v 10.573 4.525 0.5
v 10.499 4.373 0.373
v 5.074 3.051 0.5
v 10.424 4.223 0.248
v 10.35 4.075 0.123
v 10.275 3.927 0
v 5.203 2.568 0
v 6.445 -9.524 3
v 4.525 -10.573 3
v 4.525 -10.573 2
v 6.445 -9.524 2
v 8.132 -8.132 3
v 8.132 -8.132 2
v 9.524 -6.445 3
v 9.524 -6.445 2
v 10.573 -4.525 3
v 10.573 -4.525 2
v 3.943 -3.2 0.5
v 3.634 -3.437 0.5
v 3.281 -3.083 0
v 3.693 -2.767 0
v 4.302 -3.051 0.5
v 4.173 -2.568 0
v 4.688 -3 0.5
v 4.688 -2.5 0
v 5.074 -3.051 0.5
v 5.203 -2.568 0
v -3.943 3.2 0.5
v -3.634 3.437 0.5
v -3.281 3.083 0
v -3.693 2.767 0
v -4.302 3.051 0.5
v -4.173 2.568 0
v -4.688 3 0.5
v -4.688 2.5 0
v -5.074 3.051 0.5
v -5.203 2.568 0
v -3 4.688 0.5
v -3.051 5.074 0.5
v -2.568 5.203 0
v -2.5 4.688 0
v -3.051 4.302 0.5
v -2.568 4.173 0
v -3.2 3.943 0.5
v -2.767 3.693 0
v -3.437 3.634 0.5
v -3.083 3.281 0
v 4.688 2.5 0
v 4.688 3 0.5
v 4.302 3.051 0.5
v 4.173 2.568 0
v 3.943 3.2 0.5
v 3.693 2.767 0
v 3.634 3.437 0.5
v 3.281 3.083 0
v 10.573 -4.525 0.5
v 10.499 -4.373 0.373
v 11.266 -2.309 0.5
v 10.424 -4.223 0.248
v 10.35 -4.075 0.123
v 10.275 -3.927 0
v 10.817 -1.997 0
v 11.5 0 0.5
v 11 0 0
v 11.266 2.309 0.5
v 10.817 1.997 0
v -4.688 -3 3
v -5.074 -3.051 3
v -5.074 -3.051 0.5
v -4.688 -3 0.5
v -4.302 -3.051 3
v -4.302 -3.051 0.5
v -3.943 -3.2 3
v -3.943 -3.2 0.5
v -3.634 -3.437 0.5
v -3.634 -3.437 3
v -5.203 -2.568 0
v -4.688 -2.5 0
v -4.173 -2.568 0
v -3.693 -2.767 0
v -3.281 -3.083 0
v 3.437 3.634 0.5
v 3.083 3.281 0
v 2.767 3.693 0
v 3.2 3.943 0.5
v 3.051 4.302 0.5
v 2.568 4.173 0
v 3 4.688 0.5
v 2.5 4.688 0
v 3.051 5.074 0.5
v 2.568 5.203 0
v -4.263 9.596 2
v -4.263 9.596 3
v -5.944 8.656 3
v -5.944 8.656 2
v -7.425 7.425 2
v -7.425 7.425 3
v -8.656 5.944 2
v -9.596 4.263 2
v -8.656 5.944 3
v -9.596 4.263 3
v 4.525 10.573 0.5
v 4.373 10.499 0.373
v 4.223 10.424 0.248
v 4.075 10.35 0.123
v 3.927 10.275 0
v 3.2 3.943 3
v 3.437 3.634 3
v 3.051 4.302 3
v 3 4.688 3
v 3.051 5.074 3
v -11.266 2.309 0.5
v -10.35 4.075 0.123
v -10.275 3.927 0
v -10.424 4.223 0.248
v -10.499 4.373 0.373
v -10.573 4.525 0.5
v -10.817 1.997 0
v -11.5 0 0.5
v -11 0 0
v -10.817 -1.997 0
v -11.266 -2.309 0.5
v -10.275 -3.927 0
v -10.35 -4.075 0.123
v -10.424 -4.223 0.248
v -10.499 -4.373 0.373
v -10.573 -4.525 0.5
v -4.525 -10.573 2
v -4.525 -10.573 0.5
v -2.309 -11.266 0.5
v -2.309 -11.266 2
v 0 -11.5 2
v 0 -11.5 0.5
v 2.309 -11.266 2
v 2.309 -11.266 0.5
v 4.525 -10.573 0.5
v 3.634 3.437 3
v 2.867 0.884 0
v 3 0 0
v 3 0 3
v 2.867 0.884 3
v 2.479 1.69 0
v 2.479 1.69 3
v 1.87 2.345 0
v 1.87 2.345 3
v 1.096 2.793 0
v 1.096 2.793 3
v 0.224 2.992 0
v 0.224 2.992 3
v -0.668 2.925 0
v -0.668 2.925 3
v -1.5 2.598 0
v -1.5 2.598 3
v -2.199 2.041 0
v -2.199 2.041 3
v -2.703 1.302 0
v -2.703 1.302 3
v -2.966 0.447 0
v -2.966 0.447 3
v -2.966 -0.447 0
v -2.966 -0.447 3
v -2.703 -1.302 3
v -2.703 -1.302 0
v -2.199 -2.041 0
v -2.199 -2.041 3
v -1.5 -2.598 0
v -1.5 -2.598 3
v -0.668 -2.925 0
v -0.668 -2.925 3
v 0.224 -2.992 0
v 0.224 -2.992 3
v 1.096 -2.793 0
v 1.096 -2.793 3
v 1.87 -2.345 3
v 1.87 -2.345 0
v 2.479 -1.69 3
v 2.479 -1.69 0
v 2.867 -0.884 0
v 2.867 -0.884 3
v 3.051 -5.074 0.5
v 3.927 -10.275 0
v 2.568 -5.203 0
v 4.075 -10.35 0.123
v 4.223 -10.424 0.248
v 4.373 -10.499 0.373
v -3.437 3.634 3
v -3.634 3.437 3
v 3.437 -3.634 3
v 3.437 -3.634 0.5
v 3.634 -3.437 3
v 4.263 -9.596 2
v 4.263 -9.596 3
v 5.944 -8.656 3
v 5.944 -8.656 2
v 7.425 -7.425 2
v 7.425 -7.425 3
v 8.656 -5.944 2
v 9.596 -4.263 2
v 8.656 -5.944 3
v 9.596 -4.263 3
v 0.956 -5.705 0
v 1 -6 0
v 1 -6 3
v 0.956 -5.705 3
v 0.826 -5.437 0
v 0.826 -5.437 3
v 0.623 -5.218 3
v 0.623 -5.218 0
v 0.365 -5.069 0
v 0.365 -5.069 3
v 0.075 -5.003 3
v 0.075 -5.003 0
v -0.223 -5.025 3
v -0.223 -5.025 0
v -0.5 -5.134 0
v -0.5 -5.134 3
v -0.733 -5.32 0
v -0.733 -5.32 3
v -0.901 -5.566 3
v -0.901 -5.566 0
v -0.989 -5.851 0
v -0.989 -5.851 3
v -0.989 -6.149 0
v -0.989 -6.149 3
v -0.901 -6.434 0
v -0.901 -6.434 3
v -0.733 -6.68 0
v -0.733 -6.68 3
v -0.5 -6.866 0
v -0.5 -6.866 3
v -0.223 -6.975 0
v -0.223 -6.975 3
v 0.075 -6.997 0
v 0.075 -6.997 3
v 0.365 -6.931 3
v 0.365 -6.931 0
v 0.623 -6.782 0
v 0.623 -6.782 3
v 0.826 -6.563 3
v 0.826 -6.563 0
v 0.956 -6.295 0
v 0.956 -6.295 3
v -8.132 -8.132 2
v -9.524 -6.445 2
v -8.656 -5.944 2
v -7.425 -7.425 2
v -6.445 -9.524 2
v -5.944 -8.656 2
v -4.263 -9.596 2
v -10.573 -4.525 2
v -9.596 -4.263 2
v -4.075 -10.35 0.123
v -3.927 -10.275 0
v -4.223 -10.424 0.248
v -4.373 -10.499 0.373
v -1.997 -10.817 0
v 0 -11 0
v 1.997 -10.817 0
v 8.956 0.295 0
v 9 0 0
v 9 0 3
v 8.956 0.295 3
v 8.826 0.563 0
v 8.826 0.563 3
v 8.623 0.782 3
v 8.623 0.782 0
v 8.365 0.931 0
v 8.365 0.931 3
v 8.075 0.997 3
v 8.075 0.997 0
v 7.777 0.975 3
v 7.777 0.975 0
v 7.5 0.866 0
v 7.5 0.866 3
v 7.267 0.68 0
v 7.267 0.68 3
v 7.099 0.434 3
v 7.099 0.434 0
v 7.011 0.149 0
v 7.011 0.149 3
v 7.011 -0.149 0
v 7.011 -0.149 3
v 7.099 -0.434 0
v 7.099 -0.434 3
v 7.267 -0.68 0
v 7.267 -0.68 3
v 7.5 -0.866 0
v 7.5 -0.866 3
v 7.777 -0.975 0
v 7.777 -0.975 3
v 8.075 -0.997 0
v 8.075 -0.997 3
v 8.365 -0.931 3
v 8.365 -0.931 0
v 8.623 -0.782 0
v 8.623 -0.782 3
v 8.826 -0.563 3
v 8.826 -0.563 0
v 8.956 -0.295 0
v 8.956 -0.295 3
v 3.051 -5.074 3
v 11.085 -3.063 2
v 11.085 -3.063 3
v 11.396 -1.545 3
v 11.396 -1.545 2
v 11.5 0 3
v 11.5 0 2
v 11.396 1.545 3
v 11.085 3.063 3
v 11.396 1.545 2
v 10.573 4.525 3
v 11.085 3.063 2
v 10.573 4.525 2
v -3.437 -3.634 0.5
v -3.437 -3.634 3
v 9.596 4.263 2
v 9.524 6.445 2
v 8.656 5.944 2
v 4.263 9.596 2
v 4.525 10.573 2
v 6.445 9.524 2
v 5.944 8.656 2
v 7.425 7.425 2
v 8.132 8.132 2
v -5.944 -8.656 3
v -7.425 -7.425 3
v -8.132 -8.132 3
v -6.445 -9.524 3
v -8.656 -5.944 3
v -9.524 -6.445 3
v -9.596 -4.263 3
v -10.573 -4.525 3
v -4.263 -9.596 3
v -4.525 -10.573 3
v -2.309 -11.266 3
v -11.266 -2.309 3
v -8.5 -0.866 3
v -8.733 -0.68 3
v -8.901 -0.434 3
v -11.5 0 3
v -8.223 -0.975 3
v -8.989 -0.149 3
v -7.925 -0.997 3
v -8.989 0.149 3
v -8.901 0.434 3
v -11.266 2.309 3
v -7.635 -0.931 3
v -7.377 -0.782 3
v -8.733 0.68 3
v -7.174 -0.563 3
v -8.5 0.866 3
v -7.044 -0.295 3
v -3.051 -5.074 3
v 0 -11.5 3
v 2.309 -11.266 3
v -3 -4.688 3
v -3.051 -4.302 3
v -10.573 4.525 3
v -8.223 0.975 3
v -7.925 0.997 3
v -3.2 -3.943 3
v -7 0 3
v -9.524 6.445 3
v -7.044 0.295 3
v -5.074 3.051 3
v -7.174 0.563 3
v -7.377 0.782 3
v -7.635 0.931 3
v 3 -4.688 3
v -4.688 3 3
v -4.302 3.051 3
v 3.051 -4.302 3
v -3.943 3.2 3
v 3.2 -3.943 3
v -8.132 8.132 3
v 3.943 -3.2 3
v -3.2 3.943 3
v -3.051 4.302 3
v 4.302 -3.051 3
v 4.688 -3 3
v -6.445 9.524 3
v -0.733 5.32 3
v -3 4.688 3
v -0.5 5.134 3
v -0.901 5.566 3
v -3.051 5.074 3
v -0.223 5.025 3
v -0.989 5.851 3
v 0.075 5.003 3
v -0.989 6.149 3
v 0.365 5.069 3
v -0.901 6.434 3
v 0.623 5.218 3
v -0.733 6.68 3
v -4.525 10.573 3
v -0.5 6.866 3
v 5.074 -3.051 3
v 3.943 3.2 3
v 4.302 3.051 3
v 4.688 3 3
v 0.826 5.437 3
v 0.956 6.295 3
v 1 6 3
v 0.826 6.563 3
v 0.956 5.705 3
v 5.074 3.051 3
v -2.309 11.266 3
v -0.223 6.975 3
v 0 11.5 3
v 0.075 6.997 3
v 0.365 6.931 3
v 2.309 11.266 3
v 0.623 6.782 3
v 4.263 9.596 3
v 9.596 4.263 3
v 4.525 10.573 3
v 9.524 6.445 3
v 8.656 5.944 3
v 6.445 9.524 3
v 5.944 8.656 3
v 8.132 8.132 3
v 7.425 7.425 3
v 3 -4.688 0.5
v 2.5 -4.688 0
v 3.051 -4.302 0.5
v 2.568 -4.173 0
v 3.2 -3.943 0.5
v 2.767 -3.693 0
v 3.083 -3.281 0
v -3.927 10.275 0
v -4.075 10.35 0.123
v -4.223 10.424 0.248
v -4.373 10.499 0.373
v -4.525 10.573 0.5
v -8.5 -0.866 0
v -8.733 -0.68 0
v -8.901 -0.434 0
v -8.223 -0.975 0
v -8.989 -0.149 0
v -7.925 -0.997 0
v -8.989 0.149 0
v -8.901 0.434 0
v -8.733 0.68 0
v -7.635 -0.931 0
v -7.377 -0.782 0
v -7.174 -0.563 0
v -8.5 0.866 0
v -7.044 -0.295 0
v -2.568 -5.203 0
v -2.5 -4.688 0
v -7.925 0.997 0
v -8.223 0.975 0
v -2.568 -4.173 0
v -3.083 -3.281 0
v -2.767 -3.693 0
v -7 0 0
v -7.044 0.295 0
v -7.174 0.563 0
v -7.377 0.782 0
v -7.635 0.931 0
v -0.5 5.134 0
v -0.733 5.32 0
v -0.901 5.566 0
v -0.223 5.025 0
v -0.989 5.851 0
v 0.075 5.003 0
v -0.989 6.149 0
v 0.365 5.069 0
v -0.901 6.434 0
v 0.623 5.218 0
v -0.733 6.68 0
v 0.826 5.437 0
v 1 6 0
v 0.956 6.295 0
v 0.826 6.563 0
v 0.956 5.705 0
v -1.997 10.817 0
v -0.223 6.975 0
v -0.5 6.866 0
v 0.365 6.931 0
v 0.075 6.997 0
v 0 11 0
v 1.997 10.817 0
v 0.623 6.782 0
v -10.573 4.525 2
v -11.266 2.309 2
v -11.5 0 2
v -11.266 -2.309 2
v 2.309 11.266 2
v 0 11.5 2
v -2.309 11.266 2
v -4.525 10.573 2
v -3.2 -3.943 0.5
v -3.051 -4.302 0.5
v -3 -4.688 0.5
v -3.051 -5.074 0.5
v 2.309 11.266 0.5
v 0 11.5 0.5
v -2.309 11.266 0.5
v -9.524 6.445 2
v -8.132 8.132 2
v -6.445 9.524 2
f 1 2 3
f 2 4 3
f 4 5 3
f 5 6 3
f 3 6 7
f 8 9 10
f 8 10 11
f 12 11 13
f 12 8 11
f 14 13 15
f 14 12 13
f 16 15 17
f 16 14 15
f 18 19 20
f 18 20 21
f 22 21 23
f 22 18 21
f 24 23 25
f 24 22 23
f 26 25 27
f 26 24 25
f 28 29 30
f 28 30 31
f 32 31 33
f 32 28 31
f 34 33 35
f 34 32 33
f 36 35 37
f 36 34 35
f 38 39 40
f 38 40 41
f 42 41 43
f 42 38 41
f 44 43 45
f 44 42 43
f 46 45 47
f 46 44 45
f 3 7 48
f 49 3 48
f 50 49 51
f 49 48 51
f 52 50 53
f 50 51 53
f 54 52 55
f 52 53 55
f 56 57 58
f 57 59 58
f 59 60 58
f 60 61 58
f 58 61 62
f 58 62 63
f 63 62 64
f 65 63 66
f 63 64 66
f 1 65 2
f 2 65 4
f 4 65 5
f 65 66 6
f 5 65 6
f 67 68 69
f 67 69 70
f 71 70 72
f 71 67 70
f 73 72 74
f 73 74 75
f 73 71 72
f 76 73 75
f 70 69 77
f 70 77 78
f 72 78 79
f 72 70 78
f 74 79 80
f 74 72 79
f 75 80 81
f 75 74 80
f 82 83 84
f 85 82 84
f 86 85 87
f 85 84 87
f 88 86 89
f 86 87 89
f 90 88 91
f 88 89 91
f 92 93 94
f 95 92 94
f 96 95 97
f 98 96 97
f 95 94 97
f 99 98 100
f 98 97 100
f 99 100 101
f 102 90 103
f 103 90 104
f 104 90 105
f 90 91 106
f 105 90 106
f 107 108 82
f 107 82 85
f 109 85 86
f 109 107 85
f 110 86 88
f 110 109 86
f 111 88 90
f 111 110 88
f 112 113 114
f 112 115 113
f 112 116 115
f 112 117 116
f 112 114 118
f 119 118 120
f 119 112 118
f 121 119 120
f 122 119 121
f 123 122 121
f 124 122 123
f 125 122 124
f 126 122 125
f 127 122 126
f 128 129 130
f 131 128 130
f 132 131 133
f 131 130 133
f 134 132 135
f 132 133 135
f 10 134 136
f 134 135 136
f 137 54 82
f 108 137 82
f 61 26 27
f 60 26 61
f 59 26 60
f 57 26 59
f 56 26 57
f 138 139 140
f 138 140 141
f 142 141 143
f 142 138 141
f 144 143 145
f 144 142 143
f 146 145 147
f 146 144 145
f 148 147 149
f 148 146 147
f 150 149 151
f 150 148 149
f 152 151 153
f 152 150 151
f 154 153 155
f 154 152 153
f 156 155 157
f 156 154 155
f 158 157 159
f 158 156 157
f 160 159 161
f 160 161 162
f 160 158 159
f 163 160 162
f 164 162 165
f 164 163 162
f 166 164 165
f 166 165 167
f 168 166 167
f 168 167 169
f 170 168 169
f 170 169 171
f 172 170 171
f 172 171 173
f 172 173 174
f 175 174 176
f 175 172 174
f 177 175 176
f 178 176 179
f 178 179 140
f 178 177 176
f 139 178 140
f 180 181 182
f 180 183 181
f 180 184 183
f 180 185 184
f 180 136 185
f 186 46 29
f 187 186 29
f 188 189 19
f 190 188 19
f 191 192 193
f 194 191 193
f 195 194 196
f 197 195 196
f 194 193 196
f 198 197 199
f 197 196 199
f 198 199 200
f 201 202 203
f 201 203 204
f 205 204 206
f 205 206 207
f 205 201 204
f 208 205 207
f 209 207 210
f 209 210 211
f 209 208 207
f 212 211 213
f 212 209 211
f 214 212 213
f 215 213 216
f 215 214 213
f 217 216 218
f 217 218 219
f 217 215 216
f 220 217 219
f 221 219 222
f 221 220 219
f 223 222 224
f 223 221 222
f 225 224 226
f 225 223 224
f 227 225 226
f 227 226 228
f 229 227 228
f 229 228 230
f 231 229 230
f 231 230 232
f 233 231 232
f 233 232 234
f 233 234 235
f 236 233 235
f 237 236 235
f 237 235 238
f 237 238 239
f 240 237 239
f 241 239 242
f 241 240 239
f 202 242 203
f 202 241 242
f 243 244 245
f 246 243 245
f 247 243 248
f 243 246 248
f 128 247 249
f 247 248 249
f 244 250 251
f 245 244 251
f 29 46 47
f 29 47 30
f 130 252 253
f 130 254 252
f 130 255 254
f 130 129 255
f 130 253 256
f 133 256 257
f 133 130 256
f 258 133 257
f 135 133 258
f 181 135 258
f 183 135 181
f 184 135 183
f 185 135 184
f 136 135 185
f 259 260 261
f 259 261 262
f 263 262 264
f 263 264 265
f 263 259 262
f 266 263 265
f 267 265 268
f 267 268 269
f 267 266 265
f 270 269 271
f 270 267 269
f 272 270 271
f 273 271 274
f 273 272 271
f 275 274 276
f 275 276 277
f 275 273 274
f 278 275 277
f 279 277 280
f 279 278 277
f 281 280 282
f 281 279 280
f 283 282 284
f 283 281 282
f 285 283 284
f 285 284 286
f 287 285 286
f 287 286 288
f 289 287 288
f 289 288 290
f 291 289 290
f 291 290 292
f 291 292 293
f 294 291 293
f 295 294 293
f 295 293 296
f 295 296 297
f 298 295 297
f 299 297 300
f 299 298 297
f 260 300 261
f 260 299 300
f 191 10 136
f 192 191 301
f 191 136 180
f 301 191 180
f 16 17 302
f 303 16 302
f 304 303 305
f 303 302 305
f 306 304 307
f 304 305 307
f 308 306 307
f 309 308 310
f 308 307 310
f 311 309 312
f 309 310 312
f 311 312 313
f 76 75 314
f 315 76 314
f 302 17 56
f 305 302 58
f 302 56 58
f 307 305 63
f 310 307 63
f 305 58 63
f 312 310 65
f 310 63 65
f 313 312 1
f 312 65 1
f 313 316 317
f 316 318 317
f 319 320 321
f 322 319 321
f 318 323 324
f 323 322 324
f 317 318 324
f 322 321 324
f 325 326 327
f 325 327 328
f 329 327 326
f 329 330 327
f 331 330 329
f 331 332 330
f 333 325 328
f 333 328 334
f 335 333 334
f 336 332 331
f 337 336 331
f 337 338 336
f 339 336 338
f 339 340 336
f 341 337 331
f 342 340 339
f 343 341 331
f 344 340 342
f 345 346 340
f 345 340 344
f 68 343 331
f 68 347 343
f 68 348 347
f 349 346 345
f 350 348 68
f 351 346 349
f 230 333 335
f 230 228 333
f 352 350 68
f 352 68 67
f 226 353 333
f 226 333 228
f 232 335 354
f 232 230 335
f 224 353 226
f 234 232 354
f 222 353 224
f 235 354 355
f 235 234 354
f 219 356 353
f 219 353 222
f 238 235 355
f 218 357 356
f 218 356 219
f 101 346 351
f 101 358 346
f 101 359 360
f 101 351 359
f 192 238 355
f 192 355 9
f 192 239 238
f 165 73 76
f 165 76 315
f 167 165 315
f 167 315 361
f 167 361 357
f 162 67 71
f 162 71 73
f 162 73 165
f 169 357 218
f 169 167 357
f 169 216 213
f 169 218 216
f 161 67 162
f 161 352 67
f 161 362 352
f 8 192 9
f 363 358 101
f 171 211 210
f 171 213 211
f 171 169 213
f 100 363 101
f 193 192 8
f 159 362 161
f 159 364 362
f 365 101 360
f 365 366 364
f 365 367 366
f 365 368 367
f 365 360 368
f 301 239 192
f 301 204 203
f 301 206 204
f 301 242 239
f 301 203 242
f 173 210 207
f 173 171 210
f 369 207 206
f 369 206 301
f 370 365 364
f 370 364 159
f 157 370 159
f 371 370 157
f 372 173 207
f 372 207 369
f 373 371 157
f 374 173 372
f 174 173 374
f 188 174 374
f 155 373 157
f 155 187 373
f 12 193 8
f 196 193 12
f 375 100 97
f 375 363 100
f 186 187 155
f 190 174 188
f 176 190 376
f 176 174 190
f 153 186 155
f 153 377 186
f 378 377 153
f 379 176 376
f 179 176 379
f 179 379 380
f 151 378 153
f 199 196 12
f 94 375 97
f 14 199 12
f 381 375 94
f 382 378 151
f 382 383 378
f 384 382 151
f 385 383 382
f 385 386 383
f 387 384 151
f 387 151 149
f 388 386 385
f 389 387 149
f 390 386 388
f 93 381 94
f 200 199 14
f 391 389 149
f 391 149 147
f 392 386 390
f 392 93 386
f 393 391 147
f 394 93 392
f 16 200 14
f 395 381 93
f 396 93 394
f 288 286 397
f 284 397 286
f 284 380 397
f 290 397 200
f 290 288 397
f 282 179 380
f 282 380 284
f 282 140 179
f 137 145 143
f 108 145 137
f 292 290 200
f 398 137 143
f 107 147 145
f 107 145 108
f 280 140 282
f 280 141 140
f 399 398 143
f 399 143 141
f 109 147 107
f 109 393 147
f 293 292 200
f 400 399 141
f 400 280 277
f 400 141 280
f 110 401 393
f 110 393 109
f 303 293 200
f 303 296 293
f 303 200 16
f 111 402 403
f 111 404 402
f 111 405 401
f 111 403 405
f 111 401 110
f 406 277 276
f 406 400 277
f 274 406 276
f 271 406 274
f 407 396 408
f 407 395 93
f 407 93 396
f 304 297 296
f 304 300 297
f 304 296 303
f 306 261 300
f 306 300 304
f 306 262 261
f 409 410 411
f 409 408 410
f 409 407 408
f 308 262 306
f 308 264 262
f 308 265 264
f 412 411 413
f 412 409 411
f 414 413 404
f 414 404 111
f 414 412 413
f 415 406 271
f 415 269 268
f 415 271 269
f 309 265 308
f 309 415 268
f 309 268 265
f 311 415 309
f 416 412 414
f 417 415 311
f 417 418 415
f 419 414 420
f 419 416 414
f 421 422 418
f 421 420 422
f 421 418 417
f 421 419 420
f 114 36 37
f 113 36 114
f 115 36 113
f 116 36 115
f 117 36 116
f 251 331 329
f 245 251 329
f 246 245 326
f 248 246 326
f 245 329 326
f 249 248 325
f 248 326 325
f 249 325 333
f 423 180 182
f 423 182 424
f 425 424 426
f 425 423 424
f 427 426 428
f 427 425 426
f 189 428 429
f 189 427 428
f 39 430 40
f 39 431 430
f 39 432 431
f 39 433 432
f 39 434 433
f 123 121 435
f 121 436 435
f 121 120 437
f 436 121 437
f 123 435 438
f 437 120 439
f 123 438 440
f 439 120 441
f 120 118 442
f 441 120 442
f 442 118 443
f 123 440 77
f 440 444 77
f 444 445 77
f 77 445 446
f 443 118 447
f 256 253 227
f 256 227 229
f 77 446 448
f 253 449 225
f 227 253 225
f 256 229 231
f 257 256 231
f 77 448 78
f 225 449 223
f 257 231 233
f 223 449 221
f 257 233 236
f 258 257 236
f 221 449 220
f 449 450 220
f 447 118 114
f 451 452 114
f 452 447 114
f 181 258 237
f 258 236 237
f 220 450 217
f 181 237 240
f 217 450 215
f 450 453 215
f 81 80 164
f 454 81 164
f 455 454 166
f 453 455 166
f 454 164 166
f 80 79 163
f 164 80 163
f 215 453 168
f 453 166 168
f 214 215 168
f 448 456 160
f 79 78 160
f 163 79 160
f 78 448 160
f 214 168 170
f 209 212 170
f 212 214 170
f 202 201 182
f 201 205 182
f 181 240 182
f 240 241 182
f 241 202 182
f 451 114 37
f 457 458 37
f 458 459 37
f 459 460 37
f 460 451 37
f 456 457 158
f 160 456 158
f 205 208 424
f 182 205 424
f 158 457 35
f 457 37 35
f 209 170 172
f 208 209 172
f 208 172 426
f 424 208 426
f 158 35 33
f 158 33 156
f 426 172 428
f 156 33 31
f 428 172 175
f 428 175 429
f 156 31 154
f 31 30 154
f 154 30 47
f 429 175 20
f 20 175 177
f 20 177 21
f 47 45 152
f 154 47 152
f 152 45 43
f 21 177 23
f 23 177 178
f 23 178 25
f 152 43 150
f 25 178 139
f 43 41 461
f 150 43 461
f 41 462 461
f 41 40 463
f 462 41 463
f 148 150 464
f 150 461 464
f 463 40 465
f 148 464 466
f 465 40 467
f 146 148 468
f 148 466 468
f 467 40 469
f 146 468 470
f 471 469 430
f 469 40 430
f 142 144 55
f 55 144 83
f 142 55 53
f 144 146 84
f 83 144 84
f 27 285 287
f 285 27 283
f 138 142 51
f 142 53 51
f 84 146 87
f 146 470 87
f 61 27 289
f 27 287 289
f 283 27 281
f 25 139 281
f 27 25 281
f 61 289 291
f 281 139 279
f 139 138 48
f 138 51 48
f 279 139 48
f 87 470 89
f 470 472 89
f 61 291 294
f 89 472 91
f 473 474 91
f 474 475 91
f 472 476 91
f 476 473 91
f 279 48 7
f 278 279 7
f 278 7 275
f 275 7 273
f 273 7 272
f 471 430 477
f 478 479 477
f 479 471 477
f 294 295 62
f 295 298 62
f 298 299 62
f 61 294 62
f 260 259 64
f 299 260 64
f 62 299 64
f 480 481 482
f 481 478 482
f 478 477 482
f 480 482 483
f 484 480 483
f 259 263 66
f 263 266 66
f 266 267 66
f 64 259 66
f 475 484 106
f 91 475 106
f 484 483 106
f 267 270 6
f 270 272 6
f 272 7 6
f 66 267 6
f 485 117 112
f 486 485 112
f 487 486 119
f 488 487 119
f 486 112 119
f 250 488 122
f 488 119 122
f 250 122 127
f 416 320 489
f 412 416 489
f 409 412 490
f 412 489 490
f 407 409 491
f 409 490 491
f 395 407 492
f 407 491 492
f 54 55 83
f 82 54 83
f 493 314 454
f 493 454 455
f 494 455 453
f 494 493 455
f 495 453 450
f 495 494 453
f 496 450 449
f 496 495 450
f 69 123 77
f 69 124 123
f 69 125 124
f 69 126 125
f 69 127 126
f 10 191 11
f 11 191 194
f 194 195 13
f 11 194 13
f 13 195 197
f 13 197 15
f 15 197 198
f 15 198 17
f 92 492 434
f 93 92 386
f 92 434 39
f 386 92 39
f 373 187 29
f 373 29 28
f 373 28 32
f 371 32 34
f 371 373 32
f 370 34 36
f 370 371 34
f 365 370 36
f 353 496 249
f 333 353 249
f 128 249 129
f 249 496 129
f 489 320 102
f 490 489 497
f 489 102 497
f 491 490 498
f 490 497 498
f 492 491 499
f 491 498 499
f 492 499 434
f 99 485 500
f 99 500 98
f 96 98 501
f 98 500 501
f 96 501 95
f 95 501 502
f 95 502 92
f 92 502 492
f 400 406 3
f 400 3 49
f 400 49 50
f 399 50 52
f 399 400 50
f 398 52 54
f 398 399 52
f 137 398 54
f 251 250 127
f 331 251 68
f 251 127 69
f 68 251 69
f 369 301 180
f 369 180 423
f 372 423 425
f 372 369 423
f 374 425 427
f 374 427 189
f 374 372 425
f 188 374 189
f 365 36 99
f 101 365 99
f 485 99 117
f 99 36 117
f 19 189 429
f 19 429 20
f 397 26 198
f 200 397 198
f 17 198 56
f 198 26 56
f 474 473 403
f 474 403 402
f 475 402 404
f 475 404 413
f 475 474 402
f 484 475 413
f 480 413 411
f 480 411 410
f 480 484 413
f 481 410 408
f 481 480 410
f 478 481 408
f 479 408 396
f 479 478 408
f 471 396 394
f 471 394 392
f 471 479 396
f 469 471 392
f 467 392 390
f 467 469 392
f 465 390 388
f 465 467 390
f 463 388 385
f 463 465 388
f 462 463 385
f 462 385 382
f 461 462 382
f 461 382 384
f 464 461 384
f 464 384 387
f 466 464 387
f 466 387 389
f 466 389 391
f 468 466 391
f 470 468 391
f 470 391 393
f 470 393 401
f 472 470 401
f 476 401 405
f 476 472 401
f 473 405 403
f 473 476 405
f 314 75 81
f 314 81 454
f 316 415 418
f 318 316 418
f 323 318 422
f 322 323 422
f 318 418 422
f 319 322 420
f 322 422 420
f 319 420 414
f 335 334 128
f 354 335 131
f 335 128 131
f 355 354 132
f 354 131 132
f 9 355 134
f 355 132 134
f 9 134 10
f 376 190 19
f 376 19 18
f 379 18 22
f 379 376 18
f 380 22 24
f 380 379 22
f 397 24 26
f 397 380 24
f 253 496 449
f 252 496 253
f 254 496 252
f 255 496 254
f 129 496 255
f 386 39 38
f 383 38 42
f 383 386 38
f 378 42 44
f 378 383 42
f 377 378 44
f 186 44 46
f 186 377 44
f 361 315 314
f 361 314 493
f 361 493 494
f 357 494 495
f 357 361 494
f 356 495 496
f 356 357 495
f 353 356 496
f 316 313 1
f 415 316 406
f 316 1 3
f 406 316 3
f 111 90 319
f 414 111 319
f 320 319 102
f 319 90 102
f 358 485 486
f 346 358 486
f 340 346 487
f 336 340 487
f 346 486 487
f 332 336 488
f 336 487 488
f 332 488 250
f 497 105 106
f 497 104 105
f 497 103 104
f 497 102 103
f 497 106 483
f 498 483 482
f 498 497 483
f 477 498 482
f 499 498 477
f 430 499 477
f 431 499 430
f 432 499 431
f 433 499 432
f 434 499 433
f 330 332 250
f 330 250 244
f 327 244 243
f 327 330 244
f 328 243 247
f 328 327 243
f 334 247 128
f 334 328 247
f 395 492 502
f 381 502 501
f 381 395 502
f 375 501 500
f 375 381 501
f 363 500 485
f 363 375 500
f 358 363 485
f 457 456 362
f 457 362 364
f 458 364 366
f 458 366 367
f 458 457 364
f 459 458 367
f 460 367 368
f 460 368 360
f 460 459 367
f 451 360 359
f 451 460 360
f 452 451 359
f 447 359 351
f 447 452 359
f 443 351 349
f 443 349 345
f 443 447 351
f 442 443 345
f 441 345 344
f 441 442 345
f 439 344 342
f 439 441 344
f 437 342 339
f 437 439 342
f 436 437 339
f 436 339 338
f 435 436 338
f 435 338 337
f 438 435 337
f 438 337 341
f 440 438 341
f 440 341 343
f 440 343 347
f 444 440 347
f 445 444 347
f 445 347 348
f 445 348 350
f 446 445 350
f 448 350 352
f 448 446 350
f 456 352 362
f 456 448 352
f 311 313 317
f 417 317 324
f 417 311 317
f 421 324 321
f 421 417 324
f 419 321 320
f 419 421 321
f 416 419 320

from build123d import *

# Parameters (mm, degrees)
SKETCH002_R                = 11.5
SKETCH002_R_2              = 10.5
EXTRUDE005_DEPTH           = 1
EXTRUDE004_DEPTH           = 3
EXTRUDE004_PLACEMENT_ANGLE = 90
EXTRUDE002_DEPTH           = 3
EXTRUDE002_PLACEMENT_ANGLE = 90
EXTRUDE001_DEPTH           = 3
EXTRUDE003_DEPTH           = 3
EXTRUDE003_PLACEMENT_ANGLE = 180
SKETCH_R                   = 11.5
SKETCH_R_2                 = 1
SKETCH_R_3                 = 3
EXTRUDE_DEPTH              = 3
FILLET_R                   = 1.49
CHAMFER_SIZE               = 0.5
CHAMFER001_SIZE            = 0.5


with BuildPart() as extrude005:
    # Sketch002 (on Face4 of Cut) → Extrude005 (new body)
    with BuildSketch(Plane.XY.offset(3)):
        Circle(SKETCH002_R)
        Circle(SKETCH002_R_2, mode=Mode.SUBTRACT)
    extrude(amount=-EXTRUDE005_DEPTH)


with BuildPart() as extrude004:
    # Sketch001 (on Face7 of Extrude) → Extrude004 (new body)
    with BuildSketch(Plane(origin=(0, 0, 0), x_dir=(1, 0, 0), z_dir=(0, 0, -1))):
        Polygon((-11.970047, 4.898979), (-4.242641, 2.828427), (-2.828427, 4.242641), (-4.898979, 11.970047), align=None)
    extrude(amount=-EXTRUDE004_DEPTH)


with BuildPart() as extrude004_1:
    # Extrude004 placement: moved
    add(extrude004.part.rotate(Axis((0, 0, 0), (0, 0, -1)), EXTRUDE004_PLACEMENT_ANGLE))


with BuildPart() as extrude002:
    # Sketch001 (on Face7 of Extrude) → Extrude002 (new body)
    with BuildSketch(Plane(origin=(0, 0, 0), x_dir=(1, 0, 0), z_dir=(0, 0, -1))):
        Polygon((-11.970047, 4.898979), (-4.242641, 2.828427), (-2.828427, 4.242641), (-4.898979, 11.970047), align=None)
    extrude(amount=-EXTRUDE002_DEPTH)


with BuildPart() as extrude002_1:
    # Extrude002 placement: moved
    add(extrude002.part.rotate(Axis((0, 0, 0), (0, 0, 1)), EXTRUDE002_PLACEMENT_ANGLE))


with BuildPart() as extrude001:
    # Sketch001 (on Face7 of Extrude) → Extrude001 (new body)
    with BuildSketch(Plane(origin=(0, 0, 0), x_dir=(1, 0, 0), z_dir=(0, 0, -1))):
        Polygon((-11.970047, 4.898979), (-4.242641, 2.828427), (-2.828427, 4.242641), (-4.898979, 11.970047), align=None)
    extrude(amount=-EXTRUDE001_DEPTH)


with BuildPart() as fusion:
    # Sketch001 (on Face7 of Extrude) → Extrude003 (new body)
    with BuildSketch(Plane(origin=(0, 0, 0), x_dir=(1, 0, 0), z_dir=(0, 0, -1))):
        Polygon((-11.970047, 4.898979), (-4.242641, 2.828427), (-2.828427, 4.242641), (-4.898979, 11.970047), align=None)
    extrude(amount=-EXTRUDE003_DEPTH)


with BuildPart() as fusion_1:
    # Extrude003 placement: moved
    add(fusion.part.rotate(Axis((0, 0, 0), (0, 0, 1)), EXTRUDE003_PLACEMENT_ANGLE))

    # Fusion: union Extrude004, Extrude002, Extrude001
    add(extrude004_1.part)
    add(extrude002_1.part)
    add(extrude001.part)


with BuildPart() as fusion002:
    # Sketch → Extrude (new body)
    with BuildSketch(Plane.XY):
        Circle(SKETCH_R)
        with Locations((0, 6)):
            Circle(SKETCH_R_2, mode=Mode.SUBTRACT)
        with Locations((-8, 0)):
            Circle(SKETCH_R_2, mode=Mode.SUBTRACT)
        with Locations((0, -6)):
            Circle(SKETCH_R_2, mode=Mode.SUBTRACT)
        with Locations((8, 0)):
            Circle(SKETCH_R_2, mode=Mode.SUBTRACT)
        Circle(SKETCH_R_3, mode=Mode.SUBTRACT)
    extrude(amount=EXTRUDE_DEPTH)

    # Cut: cut Fusion
    add(fusion_1.part, mode=Mode.SUBTRACT)

    # Fillet
    fillet_edges = [fusion002.edges().sort_by_distance(p)[0] for p in [
        (4.242641, 2.828427, 1.5),
        (4.242641, -2.828427, 1.5),
        (2.828427, -4.242641, 1.5),
        (-2.828427, -4.242641, 1.5),
        (-4.242641, -2.828427, 1.5),
        (-4.242641, 2.828427, 1.5),
        (-2.828427, 4.242641, 1.5),
        (2.828427, 4.242641, 1.5),
    ]]
    fillet(fillet_edges, radius=FILLET_R)

    # Chamfer
    chamfer_edges = [fusion002.edges().sort_by_distance(p)[0] for p in [
        (7.823063, -3.787798, 0),
        (4.302299, -3.051077, 0),
        (3.535534, -3.535534, 0),
        (3.051077, -4.302299, 0),
        (7.823063, 3.787798, 0),
        (3.787798, -7.823063, 0),
        (4.302299, 3.051077, 0),
        (3.535534, 3.535534, 0),
        (-3.787798, -7.823063, 0),
        (3.051077, 4.302299, 0),
        (-3.051077, -4.302299, 0),
        (3.787798, 7.823063, 0),
        (-3.535534, -3.535534, 0),
        (-4.302299, -3.051077, 0),
        (-3.787798, 7.823063, 0),
        (-7.823063, -3.787798, 0),
        (-3.051077, 4.302299, 0),
        (-3.535534, 3.535534, 0),
        (-7.823063, 3.787798, 0),
        (-4.302299, 3.051077, 0),
    ]]
    chamfer(chamfer_edges, length=CHAMFER_SIZE)

    # Chamfer001
    chamfer001_edges = [fusion002.edges().sort_by_distance(p)[0] for p in [
        (11.313619, -2.062044, 0),
        (11.313619, 2.062044, 0),
        (0, -11.5, 0),
        (0, 11.5, 0),
        (-11.5, 0, 0),
    ]]
    chamfer(chamfer001_edges, length=CHAMFER001_SIZE)

    # Fusion002: union Extrude005
    add(extrude005.part)


solid = fusion002.part
